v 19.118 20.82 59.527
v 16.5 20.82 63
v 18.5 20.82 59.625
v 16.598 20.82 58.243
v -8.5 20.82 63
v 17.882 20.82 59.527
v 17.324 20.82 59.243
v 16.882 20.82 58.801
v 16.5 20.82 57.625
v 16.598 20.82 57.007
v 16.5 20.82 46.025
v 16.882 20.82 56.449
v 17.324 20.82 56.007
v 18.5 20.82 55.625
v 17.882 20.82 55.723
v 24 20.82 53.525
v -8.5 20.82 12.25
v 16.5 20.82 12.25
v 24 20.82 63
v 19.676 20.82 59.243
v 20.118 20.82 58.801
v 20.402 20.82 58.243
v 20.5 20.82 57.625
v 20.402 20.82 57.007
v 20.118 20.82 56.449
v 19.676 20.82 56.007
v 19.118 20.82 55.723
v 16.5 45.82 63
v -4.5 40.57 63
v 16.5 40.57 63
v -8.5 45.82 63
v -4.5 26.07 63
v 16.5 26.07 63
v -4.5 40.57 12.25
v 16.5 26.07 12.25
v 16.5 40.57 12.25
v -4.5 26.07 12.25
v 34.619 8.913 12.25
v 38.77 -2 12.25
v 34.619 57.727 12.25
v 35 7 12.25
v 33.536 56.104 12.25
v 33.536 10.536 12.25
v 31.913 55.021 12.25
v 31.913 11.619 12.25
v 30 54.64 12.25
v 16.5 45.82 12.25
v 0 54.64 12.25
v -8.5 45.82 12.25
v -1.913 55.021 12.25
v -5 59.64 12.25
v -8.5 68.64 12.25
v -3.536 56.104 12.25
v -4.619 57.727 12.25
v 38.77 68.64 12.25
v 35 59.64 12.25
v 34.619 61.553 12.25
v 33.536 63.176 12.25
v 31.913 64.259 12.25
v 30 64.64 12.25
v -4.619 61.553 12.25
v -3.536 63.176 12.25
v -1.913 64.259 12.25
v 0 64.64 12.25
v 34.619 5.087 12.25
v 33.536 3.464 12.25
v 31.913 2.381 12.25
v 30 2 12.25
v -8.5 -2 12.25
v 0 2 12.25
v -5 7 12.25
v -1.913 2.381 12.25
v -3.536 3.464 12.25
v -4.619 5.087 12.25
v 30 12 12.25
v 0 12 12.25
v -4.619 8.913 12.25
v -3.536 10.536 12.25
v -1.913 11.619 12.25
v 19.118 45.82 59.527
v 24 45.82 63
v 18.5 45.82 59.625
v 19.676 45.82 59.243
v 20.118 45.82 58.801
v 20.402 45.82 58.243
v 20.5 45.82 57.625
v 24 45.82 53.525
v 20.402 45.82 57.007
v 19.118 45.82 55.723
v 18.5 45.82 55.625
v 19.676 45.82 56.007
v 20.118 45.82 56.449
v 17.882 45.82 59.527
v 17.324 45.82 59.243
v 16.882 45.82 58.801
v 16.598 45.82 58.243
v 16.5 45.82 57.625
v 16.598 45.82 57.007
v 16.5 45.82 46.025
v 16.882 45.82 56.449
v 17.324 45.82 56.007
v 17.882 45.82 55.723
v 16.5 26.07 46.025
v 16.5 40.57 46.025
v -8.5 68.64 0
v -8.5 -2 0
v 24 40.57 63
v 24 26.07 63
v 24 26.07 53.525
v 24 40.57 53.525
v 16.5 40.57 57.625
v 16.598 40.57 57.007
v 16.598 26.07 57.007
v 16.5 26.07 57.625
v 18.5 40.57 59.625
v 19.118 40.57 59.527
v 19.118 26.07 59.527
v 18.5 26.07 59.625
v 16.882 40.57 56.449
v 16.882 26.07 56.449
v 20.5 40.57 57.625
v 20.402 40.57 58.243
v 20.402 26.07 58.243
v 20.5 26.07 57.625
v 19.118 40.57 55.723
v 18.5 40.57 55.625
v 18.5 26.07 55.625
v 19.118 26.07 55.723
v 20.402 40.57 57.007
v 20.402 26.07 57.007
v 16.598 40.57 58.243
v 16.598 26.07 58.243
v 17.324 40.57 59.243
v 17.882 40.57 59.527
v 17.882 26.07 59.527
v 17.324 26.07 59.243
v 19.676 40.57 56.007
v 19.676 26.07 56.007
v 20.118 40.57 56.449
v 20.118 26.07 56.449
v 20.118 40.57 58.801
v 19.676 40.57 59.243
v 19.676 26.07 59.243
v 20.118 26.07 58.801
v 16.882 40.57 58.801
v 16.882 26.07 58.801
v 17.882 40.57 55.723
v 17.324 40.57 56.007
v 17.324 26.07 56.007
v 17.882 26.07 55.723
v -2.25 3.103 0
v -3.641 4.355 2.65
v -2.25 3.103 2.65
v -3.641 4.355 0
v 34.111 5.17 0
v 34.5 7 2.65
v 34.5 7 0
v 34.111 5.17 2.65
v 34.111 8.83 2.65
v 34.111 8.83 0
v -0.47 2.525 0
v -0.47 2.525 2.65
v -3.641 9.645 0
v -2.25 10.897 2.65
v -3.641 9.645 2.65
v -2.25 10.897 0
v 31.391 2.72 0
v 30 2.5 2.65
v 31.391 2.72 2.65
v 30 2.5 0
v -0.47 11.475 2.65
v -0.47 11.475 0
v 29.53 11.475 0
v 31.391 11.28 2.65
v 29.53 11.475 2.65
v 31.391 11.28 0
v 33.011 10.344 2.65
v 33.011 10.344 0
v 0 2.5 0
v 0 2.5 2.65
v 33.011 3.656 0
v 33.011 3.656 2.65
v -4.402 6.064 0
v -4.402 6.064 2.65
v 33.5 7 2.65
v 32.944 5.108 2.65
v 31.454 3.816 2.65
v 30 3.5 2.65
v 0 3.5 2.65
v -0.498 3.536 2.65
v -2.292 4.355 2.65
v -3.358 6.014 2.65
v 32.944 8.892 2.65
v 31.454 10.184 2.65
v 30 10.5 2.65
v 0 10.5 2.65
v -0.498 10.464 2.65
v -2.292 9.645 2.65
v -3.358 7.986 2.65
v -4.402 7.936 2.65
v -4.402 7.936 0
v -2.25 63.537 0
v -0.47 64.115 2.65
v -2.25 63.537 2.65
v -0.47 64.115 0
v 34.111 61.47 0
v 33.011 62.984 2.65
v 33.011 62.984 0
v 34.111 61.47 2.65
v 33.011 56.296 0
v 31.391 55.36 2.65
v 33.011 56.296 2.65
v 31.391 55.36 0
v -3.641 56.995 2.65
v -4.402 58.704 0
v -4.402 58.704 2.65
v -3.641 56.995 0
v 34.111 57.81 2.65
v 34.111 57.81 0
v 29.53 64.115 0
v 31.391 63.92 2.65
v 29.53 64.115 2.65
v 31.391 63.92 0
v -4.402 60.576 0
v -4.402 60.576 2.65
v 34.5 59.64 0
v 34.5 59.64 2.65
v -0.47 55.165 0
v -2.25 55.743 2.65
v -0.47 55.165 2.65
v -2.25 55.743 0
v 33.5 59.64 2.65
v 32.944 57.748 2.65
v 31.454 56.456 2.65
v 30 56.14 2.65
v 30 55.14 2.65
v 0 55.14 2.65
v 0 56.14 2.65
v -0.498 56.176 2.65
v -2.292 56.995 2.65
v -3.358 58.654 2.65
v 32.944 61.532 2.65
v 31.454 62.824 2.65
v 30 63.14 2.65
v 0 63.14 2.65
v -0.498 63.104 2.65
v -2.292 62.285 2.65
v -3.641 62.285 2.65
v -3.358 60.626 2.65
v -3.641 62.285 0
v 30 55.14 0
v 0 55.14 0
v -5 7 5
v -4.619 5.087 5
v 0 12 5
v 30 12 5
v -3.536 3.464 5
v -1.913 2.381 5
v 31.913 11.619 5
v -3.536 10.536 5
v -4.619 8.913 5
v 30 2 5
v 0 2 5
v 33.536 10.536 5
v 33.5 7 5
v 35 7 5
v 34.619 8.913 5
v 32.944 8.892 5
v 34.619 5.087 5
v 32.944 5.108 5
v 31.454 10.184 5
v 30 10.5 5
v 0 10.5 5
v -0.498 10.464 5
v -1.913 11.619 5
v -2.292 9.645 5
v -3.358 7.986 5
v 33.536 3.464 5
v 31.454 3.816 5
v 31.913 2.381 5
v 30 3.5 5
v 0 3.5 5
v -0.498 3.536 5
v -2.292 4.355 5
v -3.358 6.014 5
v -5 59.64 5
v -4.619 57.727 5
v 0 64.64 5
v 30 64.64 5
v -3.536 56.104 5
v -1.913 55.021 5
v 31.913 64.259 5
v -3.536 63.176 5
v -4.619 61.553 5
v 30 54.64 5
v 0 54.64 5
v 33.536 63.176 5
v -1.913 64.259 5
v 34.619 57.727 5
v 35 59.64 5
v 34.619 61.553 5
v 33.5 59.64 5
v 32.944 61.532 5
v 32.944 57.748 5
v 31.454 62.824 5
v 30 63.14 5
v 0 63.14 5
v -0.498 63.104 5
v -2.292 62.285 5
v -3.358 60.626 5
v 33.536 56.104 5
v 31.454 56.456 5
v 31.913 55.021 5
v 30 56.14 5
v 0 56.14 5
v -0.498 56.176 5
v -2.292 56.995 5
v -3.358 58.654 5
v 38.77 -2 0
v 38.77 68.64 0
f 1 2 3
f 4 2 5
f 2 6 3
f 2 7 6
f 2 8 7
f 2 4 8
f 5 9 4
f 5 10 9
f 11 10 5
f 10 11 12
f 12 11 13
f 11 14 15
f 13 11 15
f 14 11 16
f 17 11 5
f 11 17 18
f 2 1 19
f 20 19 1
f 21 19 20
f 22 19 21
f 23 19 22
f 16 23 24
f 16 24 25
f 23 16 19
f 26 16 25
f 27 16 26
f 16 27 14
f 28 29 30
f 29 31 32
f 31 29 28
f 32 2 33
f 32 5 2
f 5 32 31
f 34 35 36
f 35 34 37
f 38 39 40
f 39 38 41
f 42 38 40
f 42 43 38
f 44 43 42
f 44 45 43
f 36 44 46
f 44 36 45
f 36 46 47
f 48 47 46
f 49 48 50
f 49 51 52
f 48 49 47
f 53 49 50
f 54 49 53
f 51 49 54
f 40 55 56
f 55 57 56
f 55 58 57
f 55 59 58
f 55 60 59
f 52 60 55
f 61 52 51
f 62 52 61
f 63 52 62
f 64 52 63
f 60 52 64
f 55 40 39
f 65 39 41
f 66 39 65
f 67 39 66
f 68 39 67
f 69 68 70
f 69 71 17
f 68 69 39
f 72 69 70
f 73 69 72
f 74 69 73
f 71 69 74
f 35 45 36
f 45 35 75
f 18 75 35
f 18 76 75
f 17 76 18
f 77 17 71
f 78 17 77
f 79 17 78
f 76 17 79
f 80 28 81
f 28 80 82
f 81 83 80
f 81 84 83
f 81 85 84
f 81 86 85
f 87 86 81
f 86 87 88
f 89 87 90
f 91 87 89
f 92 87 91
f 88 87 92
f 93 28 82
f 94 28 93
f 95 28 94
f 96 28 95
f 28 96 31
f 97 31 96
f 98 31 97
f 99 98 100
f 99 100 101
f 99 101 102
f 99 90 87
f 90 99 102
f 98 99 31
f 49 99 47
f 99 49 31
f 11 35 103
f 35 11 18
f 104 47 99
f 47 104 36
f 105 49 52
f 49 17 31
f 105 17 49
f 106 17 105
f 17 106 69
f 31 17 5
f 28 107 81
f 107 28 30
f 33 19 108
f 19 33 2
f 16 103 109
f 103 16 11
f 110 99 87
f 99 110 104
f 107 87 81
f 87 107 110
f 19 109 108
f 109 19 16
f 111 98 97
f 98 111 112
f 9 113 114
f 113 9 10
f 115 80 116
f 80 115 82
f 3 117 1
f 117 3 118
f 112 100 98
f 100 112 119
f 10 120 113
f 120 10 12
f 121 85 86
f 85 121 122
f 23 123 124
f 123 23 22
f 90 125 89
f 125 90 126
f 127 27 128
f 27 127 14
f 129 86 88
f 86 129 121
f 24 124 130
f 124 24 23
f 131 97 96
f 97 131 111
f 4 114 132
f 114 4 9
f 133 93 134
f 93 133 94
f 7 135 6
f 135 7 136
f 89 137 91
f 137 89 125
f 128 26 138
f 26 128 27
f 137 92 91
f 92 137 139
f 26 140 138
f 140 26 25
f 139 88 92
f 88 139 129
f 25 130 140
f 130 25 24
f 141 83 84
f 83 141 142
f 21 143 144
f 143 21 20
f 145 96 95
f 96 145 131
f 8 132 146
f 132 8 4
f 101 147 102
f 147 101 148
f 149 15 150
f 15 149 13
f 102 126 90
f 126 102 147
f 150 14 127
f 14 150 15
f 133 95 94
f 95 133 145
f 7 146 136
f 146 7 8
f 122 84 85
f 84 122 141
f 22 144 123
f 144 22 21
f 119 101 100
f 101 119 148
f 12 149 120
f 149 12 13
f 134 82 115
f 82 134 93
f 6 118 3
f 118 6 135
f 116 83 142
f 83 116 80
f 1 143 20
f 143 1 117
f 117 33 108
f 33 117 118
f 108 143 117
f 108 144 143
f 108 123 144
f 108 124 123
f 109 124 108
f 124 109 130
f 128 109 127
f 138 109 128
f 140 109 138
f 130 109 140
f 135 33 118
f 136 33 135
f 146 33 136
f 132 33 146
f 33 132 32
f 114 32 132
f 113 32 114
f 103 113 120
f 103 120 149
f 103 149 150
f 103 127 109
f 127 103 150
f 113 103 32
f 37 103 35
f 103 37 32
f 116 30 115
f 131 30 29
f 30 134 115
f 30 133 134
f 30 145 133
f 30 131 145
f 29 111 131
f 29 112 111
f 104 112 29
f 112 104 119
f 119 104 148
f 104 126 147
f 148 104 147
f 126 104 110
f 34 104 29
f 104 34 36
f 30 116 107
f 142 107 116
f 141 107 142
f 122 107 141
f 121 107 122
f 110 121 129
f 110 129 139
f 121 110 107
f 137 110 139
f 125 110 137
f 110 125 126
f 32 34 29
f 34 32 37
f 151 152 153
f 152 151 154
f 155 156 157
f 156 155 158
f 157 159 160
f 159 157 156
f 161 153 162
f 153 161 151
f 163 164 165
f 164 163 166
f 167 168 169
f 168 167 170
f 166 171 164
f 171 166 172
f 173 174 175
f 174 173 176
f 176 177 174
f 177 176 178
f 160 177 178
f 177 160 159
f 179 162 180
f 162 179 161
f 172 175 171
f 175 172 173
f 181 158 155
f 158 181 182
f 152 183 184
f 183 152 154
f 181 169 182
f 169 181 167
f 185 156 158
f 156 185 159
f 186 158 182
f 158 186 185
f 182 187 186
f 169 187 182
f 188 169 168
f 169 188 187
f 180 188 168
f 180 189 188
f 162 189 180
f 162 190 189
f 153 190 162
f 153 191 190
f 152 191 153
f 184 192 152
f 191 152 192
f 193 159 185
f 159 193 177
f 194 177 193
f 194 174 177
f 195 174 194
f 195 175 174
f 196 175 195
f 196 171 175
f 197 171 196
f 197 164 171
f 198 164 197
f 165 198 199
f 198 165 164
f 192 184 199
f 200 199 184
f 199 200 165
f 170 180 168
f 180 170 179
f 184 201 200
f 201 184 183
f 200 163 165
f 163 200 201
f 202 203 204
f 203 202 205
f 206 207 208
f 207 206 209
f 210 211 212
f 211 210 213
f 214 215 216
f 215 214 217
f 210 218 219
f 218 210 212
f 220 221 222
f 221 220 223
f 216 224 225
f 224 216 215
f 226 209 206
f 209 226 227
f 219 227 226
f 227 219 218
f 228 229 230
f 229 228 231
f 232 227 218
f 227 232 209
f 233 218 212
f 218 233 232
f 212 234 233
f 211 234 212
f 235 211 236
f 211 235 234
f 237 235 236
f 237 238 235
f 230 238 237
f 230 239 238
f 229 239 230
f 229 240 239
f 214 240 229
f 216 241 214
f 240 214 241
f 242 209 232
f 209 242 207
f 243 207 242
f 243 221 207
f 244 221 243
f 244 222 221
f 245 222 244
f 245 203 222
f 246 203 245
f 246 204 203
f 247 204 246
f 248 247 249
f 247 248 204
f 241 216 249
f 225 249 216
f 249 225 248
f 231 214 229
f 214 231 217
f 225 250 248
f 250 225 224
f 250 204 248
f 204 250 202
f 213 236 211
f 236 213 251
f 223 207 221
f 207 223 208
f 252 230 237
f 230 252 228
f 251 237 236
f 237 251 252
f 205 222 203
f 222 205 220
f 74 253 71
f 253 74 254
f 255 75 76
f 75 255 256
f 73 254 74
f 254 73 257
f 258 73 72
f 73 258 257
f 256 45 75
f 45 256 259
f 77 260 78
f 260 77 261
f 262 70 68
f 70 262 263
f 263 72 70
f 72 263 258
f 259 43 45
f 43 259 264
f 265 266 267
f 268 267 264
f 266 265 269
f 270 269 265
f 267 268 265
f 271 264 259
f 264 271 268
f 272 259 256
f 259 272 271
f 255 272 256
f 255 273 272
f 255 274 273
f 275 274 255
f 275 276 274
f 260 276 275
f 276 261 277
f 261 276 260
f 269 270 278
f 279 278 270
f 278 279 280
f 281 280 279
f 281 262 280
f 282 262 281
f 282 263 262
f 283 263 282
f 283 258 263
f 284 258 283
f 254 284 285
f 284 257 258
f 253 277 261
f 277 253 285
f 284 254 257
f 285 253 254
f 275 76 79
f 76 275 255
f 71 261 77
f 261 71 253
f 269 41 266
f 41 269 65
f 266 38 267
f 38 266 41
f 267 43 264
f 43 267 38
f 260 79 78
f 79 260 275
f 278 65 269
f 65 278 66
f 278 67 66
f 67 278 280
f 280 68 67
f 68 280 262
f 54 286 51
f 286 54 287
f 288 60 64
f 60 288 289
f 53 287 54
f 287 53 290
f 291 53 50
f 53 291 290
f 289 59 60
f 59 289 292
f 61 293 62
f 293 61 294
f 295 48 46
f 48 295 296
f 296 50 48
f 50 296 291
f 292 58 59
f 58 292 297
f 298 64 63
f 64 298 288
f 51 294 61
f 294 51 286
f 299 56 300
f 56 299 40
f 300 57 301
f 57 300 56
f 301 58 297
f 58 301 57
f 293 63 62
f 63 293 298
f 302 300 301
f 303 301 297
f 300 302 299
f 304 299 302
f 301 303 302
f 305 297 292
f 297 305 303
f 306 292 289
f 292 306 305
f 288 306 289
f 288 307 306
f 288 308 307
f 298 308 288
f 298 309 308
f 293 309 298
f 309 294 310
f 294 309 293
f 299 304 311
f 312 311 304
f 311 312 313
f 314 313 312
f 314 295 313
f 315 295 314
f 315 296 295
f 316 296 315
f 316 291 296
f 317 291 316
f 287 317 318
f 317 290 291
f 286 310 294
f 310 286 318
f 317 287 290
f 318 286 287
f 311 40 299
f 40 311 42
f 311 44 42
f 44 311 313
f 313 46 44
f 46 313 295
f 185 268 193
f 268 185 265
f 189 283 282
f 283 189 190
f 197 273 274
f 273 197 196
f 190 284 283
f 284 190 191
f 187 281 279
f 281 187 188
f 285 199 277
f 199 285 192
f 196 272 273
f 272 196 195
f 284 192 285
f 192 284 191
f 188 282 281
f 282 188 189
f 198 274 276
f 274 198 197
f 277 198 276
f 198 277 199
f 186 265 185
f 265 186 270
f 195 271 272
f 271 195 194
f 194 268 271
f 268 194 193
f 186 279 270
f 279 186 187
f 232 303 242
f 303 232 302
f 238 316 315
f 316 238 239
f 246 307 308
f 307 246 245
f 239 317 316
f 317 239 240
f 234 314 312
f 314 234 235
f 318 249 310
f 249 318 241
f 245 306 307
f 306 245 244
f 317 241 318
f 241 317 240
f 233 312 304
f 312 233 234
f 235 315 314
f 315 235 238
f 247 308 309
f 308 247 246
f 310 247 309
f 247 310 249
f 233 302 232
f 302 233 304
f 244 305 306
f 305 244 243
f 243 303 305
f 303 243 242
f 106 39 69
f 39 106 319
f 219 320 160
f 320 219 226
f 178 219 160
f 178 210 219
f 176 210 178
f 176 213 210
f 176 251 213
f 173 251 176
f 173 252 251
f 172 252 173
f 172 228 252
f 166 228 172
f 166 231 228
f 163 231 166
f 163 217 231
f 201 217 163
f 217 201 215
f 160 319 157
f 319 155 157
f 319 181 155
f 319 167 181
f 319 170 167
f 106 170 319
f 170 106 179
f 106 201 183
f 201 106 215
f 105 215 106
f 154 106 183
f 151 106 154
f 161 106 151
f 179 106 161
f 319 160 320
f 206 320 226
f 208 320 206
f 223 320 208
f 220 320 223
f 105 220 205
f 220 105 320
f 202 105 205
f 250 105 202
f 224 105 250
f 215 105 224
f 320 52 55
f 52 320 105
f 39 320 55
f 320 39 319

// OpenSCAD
module cutout1 () {

hull () {

translate ([0,2.5,-.1]) cube ([30,7, 2.75], center = false);
translate ([0,7,-.1]) cylinder (h = 2.75, r = 4.5, center = false);
translate ([30,7,-.1]) cylinder (h = 2.75, r = 4.5, center = false);

}

hull () {

translate ([0,55.14,-.1]) cube ([30,7, 2.75], center = false);
translate ([0,59.64,-.1]) cylinder (h = 2.75, r =4.5, center = false);
translate ([30,59.64,-.1]) cylinder (h = 2.75, r =4.5, center = false);

}


hull () {

translate ([0,2.5,5]) cube ([30,8, 7.26], center = false);
translate ([0,7,5]) cylinder (h = 7.26, r = 5, center = false);
translate ([30,7,5]) cylinder (h = 7.26, r = 5, center = false);

}


hull () {

translate ([0,55.14,5]) cube ([30, 8, 7.26], center = false);
translate ([0,59.64,5]) cylinder (h = 7.26, r = 5, center = false);
translate ([30,59.64,5]) cylinder (h = 7.26, r = 5, center = false);

}

}

module cutout2 () {

union () {

cutout1 ();


hull () {

translate ([0,3.5,0]) cube ([30,7, 12.25], center = false);
translate ([0,7,0]) cylinder (h = 12.25, r = 3.5, center = false);
translate ([30,7,0]) cylinder (h = 12.25, r = 3.5, center = false);

}

hull () {

translate ([0,56.14,0]) cube ([30,7, 12.25], center = false);
translate ([0,59.64,0]) cylinder (h = 12.25, r =3.5, center = false);
translate ([30,59.64,0]) cylinder (h = 12.25, r =3.5, center = false);

}

}

}

module base () {

difference () {

translate ([-8.5,68.64,0]) rotate ([0,0,-90]) cube ([70.64, 47.27, 12.25], center = false);
cutout2();

}

}



module final_base () {

difference () {

union(){

cube ([25, 25, 50.75], center = true);
translate ([12.5,12.5,-0.1])rotate([0, 270, 0])
linear_extrude(height = 25) polygon(points=[[0,-10],[25.475,-10],[25.475,7.5],[16,7.5],[8.5,0]], convexity = 10);


}

translate ([0,-7.5+22,20])rotate([0, 90, 0])cylinder (r = 2, h= 27, center = true, $fn=20);
translate ([0,11.5,0])cube ([14.5, 40, 80], center = true);
}
}



module Project_3 () {


union () {

translate ([4,33.32,37.625])rotate ([0,0,270])final_base();
base ();

}

}

Project_3 ();
